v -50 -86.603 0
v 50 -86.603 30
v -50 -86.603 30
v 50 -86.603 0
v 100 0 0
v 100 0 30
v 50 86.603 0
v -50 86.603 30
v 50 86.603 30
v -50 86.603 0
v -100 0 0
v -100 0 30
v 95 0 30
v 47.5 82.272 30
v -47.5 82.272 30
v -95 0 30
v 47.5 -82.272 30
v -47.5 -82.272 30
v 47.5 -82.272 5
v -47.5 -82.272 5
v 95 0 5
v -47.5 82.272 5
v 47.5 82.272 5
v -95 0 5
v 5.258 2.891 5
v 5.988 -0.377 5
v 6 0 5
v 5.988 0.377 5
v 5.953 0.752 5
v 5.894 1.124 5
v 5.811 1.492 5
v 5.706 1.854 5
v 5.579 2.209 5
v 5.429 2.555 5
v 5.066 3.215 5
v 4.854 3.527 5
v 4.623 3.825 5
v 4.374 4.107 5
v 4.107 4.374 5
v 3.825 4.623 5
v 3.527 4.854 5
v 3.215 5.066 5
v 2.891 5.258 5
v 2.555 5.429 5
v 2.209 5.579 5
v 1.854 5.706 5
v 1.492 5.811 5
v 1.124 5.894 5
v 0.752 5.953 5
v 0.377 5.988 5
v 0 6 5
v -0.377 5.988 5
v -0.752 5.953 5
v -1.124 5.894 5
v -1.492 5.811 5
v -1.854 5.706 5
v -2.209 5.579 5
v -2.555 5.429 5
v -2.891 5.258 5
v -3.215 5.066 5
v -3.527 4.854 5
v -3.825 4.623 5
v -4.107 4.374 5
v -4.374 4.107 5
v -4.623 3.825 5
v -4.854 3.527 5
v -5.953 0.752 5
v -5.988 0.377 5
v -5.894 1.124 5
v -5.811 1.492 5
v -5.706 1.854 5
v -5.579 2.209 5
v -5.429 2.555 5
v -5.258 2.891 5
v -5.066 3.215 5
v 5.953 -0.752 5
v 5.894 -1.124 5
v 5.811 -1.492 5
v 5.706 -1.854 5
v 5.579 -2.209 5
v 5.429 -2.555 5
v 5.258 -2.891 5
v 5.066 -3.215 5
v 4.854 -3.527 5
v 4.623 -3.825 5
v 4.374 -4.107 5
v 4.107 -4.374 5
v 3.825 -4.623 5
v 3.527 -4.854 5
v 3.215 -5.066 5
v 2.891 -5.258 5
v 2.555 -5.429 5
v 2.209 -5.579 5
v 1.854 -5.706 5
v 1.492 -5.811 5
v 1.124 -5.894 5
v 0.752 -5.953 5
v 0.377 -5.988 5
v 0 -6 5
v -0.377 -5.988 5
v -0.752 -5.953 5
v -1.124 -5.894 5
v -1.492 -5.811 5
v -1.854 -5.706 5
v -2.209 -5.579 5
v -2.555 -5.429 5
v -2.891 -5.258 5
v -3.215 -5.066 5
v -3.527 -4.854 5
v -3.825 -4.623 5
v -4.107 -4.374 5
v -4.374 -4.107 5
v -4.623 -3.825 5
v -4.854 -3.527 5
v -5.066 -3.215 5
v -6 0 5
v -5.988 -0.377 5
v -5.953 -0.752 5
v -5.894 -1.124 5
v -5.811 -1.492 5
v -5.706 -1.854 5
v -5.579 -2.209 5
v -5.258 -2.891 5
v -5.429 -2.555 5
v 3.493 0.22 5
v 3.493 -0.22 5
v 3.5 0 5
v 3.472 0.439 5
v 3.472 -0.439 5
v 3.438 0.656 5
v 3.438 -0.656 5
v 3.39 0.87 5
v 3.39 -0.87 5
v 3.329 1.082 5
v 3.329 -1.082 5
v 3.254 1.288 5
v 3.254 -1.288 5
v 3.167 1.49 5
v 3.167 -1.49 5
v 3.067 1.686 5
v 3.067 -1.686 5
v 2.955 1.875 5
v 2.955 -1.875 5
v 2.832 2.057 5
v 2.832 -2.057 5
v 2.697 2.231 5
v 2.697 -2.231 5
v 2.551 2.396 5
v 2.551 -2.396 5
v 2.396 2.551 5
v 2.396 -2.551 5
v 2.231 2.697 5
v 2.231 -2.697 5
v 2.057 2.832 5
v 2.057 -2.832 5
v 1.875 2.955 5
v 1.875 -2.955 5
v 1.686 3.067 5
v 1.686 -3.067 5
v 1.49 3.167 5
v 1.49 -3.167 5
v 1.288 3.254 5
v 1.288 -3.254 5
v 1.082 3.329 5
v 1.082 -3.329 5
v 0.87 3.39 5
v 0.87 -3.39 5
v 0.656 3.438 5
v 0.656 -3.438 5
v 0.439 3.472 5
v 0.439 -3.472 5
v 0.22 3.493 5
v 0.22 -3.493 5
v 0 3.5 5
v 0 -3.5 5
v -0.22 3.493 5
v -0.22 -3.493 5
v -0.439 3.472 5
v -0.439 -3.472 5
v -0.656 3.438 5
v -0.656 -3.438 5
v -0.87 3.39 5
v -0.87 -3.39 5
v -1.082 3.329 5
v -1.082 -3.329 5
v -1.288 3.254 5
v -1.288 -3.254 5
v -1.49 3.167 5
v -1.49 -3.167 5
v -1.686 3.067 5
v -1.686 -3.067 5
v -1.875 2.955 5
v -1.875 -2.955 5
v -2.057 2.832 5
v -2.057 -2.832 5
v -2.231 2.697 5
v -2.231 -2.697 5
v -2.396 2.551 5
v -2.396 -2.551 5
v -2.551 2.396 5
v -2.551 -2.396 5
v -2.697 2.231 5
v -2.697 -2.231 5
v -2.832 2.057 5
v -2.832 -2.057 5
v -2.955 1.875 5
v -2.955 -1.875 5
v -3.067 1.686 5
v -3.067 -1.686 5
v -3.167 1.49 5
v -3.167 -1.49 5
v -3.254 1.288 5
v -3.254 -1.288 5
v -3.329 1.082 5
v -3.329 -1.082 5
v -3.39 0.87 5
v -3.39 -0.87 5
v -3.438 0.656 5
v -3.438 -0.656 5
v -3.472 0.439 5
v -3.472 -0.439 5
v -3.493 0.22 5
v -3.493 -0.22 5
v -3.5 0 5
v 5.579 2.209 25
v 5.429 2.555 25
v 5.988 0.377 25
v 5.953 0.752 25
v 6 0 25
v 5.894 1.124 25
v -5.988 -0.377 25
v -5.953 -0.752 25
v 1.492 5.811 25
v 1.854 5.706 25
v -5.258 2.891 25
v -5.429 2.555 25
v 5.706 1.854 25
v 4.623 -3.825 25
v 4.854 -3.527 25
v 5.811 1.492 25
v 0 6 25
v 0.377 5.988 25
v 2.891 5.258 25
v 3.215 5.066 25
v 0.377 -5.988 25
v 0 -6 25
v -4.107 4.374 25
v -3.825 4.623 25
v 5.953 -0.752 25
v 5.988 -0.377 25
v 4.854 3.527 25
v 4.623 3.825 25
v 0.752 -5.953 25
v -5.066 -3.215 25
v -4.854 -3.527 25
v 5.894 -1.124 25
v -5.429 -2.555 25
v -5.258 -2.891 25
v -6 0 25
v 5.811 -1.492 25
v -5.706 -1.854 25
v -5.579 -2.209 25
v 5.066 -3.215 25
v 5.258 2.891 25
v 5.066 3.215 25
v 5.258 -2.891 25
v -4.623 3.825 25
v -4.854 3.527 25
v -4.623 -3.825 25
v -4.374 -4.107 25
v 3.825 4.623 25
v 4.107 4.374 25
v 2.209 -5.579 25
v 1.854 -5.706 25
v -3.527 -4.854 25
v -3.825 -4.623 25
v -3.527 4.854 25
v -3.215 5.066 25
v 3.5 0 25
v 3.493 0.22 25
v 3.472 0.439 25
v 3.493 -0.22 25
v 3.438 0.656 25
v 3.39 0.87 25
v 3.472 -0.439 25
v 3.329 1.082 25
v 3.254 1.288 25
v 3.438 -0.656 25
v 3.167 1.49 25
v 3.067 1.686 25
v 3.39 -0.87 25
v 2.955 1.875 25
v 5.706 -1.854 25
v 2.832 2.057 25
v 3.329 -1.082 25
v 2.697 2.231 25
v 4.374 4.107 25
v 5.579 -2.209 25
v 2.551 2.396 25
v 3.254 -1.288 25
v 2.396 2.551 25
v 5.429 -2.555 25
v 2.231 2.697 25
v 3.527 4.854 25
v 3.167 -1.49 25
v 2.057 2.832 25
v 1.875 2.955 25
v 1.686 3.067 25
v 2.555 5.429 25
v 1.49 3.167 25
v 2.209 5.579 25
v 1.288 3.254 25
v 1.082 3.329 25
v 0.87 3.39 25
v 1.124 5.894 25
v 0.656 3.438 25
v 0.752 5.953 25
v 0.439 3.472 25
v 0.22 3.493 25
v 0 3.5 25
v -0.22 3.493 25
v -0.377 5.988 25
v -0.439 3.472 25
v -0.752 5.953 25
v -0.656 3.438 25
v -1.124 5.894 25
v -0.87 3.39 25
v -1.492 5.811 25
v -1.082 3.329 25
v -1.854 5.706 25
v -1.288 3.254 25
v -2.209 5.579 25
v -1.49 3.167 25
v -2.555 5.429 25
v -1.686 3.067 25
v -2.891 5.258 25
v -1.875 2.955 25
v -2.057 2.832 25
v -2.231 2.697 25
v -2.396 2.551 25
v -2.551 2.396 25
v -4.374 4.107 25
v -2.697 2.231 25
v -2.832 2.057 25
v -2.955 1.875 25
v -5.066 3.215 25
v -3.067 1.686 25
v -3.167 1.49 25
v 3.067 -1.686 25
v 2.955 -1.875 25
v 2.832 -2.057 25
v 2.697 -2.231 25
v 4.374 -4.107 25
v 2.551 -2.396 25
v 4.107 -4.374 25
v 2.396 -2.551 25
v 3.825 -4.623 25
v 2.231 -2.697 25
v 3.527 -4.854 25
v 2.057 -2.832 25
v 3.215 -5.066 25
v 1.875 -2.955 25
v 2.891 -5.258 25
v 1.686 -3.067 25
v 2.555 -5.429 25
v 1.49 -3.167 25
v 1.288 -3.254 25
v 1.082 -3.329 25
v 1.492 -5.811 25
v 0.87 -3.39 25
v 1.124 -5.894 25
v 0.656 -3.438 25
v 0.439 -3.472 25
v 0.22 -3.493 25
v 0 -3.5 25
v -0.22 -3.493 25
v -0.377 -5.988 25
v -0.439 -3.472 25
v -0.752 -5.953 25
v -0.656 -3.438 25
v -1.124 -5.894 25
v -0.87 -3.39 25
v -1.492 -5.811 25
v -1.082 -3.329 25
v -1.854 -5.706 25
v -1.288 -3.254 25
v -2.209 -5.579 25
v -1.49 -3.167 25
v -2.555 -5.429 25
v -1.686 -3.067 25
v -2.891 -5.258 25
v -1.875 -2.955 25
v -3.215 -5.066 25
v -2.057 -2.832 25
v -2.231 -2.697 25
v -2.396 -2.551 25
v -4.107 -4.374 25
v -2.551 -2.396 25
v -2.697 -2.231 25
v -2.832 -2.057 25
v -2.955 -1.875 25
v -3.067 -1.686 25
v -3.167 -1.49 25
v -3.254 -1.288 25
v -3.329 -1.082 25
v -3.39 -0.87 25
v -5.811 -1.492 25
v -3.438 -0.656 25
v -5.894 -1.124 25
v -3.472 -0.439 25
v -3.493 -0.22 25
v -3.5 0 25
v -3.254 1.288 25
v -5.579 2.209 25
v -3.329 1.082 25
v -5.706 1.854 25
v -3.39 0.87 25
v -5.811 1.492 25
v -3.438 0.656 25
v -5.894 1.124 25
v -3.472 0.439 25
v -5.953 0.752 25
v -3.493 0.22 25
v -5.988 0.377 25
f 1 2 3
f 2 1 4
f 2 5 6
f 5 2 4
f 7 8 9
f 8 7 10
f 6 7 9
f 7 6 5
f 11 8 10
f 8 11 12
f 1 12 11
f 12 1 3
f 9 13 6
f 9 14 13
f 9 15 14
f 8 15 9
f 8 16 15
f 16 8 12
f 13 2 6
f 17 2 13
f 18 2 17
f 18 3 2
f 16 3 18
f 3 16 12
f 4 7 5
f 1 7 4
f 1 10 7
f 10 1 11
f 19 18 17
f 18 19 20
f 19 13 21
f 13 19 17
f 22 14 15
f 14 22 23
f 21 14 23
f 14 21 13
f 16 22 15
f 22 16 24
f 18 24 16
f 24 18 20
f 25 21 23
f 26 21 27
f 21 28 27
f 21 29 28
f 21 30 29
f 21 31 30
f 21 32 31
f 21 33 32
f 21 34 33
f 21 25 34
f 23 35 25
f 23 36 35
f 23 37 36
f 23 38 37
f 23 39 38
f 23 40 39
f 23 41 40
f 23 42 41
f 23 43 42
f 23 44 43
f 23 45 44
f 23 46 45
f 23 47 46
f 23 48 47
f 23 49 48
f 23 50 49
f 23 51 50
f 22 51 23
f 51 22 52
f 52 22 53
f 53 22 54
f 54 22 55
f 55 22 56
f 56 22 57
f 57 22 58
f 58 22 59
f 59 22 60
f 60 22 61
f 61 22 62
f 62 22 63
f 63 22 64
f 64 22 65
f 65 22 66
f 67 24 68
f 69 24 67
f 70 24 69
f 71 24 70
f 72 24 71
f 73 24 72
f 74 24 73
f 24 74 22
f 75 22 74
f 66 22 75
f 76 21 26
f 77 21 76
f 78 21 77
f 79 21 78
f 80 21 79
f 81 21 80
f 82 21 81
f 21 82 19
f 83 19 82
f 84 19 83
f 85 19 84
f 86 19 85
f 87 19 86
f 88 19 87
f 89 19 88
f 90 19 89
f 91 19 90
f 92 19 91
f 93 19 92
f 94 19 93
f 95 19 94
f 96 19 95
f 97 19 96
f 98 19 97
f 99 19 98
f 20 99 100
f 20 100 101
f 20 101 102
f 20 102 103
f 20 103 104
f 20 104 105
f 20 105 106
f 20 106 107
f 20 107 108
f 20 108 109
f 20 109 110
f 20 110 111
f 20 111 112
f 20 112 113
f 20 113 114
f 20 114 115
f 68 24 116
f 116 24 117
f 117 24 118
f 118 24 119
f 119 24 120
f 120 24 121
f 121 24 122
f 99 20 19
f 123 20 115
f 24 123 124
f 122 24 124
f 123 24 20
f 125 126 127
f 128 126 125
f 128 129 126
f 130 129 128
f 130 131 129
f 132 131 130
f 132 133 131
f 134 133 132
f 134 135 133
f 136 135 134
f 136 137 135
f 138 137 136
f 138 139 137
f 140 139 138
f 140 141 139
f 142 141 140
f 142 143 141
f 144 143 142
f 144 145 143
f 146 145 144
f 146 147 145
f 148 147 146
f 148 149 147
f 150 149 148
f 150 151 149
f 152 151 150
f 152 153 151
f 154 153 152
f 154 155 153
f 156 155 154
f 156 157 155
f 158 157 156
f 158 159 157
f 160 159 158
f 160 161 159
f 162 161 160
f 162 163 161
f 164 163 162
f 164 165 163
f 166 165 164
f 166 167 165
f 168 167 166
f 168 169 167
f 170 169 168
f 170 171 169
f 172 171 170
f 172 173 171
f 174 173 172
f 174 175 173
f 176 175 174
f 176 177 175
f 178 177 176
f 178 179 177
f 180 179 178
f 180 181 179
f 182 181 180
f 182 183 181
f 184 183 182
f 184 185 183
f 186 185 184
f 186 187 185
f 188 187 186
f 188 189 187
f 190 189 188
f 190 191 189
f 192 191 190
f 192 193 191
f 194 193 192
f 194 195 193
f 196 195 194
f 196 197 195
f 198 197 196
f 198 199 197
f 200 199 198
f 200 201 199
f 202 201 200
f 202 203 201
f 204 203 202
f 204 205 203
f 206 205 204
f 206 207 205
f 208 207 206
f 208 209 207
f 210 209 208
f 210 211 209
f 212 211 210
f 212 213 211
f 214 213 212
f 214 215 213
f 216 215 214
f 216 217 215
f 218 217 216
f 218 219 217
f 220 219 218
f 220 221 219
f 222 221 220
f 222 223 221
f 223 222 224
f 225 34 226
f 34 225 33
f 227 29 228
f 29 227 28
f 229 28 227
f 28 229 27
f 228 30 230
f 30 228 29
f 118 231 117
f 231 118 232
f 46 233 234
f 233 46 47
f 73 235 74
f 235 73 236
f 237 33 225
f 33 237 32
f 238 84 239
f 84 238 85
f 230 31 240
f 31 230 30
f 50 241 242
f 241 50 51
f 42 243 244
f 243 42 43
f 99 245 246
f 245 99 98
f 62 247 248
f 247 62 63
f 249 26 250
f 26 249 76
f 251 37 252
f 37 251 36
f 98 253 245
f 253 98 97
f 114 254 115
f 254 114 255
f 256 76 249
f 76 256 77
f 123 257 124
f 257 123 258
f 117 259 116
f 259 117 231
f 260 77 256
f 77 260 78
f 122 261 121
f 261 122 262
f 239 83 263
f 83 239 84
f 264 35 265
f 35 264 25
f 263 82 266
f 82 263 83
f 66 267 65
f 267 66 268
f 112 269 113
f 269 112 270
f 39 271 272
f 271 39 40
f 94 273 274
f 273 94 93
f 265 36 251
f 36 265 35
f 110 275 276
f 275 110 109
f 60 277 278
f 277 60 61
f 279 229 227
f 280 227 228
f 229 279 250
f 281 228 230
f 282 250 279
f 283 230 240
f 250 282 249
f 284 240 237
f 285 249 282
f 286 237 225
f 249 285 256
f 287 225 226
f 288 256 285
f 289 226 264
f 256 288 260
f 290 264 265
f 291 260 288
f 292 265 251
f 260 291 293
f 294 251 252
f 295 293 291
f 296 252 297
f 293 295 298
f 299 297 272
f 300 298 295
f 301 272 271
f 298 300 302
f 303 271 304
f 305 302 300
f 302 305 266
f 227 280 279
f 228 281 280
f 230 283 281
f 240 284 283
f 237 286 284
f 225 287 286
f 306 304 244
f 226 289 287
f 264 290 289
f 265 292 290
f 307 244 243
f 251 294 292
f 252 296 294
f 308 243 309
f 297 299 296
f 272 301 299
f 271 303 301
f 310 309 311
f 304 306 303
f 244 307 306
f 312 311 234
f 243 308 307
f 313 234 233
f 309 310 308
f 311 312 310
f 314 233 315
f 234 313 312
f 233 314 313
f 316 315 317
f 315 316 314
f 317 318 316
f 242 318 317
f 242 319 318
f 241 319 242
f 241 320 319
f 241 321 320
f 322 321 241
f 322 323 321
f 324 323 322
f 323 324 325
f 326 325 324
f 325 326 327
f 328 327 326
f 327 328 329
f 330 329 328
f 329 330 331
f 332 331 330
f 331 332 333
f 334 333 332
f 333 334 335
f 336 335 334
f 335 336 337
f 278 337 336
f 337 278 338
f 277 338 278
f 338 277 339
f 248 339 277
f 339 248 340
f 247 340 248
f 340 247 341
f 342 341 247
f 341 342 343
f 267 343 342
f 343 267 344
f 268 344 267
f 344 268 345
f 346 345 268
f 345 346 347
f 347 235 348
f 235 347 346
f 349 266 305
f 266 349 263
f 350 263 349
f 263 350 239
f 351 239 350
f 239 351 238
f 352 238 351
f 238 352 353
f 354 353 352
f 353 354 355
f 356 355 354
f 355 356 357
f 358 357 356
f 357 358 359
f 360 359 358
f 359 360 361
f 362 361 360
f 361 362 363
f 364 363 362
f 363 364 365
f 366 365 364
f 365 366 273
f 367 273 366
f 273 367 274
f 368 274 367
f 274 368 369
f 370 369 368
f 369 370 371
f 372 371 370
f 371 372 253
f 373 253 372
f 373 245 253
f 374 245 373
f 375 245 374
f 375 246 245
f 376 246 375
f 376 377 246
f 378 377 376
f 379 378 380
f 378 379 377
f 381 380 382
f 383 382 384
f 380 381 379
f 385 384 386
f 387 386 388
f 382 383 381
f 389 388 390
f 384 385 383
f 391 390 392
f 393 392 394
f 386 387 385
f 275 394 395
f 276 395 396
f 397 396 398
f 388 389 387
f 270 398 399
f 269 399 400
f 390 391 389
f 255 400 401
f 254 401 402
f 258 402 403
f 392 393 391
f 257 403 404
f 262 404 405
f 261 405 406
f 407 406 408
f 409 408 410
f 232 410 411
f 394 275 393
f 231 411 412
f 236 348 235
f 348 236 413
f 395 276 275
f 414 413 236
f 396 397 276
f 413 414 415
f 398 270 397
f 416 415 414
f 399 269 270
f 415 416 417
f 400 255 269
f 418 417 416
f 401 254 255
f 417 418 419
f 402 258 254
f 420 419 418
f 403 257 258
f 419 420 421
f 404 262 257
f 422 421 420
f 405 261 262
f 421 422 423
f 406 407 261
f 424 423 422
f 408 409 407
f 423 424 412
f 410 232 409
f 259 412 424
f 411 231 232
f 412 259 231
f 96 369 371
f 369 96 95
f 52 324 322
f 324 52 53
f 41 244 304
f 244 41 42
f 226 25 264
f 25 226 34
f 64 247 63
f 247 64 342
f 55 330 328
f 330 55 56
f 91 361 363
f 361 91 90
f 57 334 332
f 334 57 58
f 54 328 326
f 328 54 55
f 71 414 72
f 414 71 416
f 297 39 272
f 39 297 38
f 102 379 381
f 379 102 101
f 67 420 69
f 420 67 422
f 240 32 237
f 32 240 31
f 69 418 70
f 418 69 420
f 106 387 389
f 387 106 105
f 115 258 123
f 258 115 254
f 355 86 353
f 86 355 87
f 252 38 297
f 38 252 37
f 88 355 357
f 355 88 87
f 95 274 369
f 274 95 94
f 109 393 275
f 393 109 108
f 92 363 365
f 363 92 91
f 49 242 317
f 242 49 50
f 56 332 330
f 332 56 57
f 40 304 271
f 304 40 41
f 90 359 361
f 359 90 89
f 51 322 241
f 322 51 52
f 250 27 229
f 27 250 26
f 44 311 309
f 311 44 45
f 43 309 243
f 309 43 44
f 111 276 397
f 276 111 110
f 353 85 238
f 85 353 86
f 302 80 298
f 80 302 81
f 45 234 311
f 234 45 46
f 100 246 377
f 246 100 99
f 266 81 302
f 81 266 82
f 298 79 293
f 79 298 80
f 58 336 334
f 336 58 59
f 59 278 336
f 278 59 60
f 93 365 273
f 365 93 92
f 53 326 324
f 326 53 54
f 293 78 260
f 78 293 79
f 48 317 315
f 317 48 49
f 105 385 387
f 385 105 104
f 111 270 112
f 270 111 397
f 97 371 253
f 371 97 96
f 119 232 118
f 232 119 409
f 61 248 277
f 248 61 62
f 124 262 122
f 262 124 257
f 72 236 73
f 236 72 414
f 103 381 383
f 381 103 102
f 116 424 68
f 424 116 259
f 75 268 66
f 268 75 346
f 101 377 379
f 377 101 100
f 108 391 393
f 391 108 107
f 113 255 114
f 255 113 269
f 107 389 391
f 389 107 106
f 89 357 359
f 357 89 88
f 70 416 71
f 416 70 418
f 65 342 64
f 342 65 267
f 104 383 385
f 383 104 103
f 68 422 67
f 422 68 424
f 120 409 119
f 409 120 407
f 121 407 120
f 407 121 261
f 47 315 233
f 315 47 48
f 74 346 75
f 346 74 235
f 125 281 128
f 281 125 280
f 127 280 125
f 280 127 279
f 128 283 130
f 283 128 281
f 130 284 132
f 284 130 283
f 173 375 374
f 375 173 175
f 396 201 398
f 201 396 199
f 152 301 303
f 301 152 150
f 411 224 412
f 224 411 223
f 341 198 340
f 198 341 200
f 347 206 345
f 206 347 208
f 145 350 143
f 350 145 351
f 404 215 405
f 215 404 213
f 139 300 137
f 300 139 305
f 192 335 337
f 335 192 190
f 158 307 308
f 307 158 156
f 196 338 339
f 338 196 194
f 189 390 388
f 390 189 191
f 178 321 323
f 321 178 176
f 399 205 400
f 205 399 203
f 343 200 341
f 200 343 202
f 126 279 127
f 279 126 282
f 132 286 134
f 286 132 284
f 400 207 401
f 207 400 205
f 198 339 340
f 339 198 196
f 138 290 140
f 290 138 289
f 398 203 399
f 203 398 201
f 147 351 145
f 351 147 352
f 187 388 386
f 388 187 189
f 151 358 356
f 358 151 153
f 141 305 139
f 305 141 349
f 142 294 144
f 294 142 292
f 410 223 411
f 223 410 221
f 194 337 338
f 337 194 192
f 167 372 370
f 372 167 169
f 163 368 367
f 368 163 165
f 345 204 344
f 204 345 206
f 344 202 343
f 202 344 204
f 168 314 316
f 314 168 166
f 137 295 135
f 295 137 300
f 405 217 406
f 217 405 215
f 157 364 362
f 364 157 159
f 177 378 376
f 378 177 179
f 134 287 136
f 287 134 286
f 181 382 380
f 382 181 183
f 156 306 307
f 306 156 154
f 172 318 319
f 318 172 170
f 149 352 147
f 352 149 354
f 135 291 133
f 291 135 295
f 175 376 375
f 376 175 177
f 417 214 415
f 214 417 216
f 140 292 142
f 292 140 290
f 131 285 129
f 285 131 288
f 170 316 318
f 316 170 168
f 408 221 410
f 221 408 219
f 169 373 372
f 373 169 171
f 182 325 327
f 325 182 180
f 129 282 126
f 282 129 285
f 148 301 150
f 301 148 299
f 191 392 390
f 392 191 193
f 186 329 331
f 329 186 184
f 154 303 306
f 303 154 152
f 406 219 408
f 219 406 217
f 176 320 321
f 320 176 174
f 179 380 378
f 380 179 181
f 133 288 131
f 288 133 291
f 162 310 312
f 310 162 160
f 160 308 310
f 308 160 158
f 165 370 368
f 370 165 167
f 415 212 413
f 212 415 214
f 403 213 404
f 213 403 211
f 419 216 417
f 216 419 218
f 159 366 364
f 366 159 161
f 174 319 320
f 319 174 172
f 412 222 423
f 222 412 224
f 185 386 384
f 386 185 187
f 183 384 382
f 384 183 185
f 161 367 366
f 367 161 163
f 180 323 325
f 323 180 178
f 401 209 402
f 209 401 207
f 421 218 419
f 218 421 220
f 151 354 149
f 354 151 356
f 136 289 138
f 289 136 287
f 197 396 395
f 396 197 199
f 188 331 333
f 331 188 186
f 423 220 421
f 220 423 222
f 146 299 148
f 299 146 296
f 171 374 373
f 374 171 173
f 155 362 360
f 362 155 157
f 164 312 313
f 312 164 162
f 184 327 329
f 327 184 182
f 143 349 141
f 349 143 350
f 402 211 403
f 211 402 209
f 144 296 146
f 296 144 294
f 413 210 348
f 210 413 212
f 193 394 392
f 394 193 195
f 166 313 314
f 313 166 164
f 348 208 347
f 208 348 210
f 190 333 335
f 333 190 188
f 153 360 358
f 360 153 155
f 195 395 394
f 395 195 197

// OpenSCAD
use <MCAD/regular_shapes.scad>

difference () {
    cylinder($fn = 6, h = 30, r = 100);

    translate ([0,0,5]) {
        cylinder($fn = 6, h = 29, r = 95);
    }
} 

difference () {
    translate([0,0,5]) {
    cylinder($fn = 100, h = 20, r = 6);
    }
    
    cylinder($fn = 100, h = 30, r = 3.5);
}
